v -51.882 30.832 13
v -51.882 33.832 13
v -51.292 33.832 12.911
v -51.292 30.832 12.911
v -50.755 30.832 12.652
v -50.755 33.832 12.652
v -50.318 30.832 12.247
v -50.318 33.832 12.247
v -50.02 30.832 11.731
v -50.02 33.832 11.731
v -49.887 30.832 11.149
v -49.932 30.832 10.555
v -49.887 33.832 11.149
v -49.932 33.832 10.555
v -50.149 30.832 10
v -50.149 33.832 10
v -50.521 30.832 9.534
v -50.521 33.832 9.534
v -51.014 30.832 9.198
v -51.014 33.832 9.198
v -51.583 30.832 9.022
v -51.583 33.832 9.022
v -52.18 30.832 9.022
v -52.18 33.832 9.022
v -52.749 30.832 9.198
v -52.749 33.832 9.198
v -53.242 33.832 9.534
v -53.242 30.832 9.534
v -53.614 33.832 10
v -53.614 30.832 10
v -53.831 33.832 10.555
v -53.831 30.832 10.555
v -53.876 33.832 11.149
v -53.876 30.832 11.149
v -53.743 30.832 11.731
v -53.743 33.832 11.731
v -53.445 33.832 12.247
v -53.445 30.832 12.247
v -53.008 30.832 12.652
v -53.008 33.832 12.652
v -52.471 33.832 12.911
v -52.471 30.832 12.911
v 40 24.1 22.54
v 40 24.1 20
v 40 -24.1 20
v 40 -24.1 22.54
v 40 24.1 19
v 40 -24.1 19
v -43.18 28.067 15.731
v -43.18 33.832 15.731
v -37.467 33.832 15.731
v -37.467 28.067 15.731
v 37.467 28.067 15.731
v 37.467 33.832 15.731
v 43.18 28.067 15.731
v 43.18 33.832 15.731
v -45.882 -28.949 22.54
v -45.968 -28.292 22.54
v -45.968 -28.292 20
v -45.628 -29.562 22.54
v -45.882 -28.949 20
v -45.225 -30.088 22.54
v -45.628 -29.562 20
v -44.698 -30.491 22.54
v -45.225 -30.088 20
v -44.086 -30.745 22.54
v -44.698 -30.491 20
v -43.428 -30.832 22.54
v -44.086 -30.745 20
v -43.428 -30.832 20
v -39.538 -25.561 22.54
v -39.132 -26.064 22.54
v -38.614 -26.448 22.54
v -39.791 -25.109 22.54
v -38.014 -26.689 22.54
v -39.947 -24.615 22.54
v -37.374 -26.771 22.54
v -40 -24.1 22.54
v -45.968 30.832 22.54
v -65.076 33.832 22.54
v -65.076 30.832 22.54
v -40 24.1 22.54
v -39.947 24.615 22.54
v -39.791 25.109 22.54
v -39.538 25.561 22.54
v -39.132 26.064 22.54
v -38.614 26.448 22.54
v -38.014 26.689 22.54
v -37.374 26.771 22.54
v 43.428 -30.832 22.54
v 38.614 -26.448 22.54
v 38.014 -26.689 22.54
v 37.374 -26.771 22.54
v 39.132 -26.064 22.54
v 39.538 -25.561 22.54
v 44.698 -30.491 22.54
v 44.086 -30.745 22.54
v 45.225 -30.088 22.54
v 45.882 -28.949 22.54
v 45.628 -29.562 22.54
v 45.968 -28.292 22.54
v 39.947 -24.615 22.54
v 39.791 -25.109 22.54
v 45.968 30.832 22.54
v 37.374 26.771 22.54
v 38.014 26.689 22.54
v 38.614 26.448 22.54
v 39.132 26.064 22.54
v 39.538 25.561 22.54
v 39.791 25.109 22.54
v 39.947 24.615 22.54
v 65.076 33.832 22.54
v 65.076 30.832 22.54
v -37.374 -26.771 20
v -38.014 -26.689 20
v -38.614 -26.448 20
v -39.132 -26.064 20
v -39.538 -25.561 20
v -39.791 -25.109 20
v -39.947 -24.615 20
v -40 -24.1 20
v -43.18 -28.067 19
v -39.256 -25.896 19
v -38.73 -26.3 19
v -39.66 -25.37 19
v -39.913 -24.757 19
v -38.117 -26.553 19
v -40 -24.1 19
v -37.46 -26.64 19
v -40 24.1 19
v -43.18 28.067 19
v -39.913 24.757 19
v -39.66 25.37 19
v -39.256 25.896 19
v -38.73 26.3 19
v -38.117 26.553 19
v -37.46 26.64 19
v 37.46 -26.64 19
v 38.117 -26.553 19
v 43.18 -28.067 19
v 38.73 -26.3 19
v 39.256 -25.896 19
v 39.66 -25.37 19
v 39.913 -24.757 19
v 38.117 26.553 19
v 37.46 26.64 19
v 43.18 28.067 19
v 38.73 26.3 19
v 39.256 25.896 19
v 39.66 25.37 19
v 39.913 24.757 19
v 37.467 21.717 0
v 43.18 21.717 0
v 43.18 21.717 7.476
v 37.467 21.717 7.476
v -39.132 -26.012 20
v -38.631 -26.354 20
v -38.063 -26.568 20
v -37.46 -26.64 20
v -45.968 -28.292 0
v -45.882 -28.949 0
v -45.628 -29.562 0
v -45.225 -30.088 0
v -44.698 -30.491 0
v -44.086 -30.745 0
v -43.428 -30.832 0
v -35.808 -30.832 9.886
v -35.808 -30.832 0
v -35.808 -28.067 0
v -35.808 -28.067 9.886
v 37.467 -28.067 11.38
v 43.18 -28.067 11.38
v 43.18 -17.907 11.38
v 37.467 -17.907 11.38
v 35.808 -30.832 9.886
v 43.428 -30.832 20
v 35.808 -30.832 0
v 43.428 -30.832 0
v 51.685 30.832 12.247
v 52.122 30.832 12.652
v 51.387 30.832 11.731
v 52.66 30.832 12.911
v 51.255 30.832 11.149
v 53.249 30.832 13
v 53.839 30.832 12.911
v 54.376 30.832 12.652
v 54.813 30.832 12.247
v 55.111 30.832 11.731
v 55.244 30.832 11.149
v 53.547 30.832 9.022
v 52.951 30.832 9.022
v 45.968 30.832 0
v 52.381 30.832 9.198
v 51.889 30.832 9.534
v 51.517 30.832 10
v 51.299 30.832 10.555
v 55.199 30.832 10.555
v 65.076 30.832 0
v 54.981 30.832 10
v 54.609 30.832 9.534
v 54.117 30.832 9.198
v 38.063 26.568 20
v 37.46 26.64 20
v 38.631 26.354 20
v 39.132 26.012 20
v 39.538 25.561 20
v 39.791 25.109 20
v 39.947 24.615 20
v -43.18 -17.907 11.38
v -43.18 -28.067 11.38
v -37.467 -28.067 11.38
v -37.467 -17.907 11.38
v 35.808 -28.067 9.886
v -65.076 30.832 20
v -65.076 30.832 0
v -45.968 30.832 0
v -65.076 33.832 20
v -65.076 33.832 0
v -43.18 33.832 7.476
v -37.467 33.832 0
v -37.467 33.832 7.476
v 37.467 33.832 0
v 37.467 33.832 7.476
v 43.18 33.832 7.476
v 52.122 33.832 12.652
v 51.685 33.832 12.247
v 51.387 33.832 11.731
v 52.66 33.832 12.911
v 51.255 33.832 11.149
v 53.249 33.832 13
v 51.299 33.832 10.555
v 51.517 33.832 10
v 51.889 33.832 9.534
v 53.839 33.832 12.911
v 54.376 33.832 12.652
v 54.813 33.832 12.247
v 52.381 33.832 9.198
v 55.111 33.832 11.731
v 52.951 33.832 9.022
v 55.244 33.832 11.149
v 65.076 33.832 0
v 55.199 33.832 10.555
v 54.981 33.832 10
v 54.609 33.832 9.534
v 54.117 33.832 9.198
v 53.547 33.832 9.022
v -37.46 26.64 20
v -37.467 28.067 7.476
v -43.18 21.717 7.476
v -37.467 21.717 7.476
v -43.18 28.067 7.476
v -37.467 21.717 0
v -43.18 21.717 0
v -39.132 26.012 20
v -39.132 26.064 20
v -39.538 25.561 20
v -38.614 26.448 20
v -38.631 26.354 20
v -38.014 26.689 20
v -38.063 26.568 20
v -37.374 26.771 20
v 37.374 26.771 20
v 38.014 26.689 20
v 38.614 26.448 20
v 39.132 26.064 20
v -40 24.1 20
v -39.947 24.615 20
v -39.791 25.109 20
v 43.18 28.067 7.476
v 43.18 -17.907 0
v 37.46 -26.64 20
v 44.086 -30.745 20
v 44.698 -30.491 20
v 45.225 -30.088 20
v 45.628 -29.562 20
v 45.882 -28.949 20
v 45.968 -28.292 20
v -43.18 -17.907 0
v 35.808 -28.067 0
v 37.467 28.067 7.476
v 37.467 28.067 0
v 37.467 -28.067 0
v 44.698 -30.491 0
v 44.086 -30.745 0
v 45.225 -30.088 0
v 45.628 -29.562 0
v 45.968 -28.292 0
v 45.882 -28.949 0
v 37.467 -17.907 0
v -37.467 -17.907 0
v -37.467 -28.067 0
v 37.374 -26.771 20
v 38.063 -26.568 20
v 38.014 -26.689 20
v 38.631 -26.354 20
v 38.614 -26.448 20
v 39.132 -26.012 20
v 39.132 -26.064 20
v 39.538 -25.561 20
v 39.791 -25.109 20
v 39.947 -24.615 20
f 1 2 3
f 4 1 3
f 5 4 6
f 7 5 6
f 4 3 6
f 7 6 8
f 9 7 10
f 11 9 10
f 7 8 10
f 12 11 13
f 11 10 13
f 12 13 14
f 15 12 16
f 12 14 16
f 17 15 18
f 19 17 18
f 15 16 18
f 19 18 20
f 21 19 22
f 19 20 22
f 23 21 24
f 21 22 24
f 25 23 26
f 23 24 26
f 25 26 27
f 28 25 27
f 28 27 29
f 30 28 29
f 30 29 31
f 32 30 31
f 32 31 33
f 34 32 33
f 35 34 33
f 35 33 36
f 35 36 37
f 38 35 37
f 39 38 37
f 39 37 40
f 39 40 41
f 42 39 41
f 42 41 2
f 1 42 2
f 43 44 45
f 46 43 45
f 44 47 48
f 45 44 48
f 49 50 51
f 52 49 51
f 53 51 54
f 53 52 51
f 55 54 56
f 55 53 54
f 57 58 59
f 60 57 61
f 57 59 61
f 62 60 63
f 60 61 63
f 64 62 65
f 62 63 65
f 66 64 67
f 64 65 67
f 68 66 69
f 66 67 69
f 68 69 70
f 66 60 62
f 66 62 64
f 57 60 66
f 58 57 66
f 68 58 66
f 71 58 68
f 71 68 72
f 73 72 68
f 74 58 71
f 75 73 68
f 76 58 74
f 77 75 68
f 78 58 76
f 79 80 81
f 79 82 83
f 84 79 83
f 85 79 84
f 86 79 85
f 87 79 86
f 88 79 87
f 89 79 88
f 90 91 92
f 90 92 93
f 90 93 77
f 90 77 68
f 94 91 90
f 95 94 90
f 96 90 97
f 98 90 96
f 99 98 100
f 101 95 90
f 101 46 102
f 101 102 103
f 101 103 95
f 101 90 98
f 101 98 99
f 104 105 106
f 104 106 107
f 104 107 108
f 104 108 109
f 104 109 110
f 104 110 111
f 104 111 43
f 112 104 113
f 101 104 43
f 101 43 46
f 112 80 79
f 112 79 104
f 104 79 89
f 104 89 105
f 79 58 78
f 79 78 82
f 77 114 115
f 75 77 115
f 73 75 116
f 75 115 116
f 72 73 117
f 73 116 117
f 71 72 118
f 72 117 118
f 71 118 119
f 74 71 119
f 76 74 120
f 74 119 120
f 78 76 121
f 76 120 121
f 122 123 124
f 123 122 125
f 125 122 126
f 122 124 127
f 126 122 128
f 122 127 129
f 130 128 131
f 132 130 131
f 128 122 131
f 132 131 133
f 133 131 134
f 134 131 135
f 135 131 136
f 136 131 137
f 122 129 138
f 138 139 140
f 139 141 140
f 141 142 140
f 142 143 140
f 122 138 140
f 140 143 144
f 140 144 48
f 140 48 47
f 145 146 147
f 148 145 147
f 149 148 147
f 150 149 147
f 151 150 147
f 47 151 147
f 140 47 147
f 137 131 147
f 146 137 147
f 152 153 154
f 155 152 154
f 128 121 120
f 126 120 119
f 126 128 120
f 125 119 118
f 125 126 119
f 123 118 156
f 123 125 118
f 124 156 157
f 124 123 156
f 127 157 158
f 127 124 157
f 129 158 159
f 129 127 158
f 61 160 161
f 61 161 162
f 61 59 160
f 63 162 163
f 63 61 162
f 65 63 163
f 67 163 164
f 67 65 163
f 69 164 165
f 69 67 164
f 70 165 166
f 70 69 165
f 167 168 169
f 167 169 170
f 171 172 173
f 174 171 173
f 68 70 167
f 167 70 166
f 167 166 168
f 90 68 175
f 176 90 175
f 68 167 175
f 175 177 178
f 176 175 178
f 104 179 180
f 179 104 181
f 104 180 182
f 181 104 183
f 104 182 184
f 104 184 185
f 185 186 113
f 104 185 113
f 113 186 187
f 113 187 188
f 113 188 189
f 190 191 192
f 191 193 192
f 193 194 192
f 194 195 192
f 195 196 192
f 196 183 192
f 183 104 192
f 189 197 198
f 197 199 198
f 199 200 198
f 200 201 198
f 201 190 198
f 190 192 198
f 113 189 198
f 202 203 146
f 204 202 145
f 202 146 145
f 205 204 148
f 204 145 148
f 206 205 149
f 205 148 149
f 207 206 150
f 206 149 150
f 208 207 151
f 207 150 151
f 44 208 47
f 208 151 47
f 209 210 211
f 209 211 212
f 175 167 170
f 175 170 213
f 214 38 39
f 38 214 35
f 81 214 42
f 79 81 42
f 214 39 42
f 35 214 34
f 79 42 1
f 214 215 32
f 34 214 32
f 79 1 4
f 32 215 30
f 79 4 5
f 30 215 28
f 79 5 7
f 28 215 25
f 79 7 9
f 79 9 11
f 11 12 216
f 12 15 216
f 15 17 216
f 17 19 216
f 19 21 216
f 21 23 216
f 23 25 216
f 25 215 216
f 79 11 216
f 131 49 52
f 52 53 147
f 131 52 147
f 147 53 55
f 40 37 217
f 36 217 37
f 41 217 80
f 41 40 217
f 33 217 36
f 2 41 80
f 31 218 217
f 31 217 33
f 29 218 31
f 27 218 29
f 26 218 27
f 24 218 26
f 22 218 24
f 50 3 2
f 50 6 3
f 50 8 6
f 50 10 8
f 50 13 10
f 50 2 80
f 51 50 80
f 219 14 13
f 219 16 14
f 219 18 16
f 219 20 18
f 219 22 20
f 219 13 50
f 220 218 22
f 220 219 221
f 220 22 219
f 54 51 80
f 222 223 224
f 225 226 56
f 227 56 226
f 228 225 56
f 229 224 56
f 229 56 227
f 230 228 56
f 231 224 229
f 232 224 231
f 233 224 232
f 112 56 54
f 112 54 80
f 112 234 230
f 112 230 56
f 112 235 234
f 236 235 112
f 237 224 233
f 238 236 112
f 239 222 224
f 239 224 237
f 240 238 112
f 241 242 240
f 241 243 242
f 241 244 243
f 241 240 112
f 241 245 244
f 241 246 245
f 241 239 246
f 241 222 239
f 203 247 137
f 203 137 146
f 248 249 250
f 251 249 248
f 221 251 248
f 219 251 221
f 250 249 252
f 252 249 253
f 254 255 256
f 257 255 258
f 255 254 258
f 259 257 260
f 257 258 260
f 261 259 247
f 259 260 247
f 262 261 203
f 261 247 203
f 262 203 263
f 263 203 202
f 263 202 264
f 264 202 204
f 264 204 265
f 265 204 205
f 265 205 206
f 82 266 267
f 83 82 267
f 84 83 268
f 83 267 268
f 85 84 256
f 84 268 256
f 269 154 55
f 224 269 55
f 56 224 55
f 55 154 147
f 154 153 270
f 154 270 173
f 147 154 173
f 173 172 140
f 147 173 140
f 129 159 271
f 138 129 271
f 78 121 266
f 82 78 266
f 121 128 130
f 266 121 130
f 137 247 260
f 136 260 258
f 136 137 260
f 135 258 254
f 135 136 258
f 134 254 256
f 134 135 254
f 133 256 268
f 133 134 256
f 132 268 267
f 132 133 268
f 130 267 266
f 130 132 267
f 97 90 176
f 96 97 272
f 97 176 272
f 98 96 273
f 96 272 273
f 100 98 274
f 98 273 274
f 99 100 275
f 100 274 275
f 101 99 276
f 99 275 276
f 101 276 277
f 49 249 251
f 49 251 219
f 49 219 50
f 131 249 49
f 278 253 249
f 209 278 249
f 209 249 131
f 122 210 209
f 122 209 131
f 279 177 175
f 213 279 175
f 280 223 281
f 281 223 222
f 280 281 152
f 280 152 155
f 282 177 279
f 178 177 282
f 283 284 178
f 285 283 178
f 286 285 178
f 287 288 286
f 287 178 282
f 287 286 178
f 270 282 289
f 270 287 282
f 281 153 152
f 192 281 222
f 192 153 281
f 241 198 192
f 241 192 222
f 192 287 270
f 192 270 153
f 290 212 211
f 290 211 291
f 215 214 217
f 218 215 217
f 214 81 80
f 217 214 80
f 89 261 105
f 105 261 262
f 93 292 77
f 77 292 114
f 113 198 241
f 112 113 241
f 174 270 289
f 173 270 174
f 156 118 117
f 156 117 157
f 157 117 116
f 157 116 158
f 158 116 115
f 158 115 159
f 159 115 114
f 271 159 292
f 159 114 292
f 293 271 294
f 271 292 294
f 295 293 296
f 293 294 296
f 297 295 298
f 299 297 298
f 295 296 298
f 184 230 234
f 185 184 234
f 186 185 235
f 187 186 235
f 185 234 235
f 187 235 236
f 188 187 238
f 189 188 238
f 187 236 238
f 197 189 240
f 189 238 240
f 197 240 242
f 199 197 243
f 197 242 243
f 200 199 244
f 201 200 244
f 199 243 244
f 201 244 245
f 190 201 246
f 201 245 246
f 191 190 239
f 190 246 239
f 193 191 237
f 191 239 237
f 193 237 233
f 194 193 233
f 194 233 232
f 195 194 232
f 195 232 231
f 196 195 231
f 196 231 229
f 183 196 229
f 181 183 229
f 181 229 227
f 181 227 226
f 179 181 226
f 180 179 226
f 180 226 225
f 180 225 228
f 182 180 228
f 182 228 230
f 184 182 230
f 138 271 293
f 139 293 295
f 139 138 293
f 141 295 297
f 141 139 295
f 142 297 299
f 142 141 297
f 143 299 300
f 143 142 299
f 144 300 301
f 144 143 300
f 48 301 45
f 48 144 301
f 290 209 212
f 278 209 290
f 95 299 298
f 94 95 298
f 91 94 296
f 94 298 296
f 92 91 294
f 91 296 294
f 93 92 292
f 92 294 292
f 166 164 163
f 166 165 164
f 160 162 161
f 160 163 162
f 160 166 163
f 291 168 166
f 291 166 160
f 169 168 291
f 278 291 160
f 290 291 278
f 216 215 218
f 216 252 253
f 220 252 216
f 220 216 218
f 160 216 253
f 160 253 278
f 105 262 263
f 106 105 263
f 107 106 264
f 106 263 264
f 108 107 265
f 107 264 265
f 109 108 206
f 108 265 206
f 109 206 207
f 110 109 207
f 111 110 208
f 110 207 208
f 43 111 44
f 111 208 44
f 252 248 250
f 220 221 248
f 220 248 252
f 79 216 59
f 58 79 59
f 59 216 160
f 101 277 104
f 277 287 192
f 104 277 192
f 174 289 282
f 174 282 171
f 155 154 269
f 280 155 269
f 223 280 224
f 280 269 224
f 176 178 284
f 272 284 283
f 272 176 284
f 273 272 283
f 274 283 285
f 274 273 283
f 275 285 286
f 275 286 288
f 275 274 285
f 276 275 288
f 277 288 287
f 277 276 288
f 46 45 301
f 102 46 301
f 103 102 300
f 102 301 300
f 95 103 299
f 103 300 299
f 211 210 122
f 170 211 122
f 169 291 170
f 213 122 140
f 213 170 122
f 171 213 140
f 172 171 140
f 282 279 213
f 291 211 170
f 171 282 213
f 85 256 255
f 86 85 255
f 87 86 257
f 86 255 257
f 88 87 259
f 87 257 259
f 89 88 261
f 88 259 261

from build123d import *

# Parameters (mm, degrees)
SKETCH1_W            = 91.936945468
SKETCH1_H            = 61.663418702
SKETCH1_W_2          = 86.36
SKETCH1_H_2          = 56.134
BOSS_EXTRUDE1_DEPTH  = 20
SKETCH2_W            = 86.36
SKETCH2_H            = 56.134
BOSS_EXTRUDE3_DEPTH  = 1
SKETCH4_W            = 80
SKETCH4_H            = 53.28
CUT_EXTRUDE6_DEPTH   = 59.853162931
SKETCH5_W            = 155.947075919
SKETCH5_H            = 20
BOSS_EXTRUDE4_DEPTH  = 3
SKETCH8_W            = 12.917881336
SKETCH8_H            = 3
CUT_EXTRUDE7_DEPTH   = 88.335862802
SKETCH9_W            = 12.878183793
SKETCH9_H            = 3
CUT_EXTRUDE8_DEPTH   = 88.300413605
SKETCH10_R           = 2
CUT_EXTRUDE9_DEPTH   = 94.894510599
SKETCH10_3_R         = 2
CUT_EXTRUDE10_DEPTH  = 94.894510599
SKETCH11_W           = 74.933585118
SKETCH11_H           = 15.731166257
CUT_EXTRUDE11_DEPTH  = 20
FILLET1_R            = 2.54
FILLET2_R            = 2.54
FILLET3_R            = 2.54
FILLET4_R            = 2.54
FILLET5_R            = 2.54
FILLET6_R            = 2.54
SKETCH14_W           = 5.713207441
SKETCH14_H           = 8.255
CUT_EXTRUDE12_DEPTH  = 91.021549452
SKETCH15_W           = 5.713207441
SKETCH15_H           = 8.255
CUT_EXTRUDE13_DEPTH  = 91.021549452
SKETCH16_W           = 7.476166257
SKETCH16_H           = 6.35
BOSS_EXTRUDE5_DEPTH  = 5.713207
SKETCH17_W           = 7.476166257
SKETCH17_H           = 6.35
BOSS_EXTRUDE6_DEPTH  = 5.713207441
SKETCH18_W           = 11.38
SKETCH18_H           = 10.16
BOSS_EXTRUDE7_DEPTH  = 5.713207441
SKETCH19_W           = 11.38
SKETCH19_H           = 10.16
BOSS_EXTRUDE8_DEPTH  = 5.713207441
SKETCH20_W           = 71.616945468
SKETCH20_H           = 9.886340198
CUT_EXTRUDE14_DEPTH  = 94.894510599
SKETCH23_W           = 130.15101079
SKETCH23_H           = 3
BOSS_EXTRUDE14_DEPTH = 2.54


with BuildPart() as part:
    # Sketch1 → Boss-Extrude1 (new body)
    with BuildSketch(Plane.XY):
        Rectangle(SKETCH1_W, SKETCH1_H)
        Rectangle(SKETCH1_W_2, SKETCH1_H_2, mode=Mode.SUBTRACT)
    extrude(amount=BOSS_EXTRUDE1_DEPTH)

    # Sketch2 → Boss-Extrude3 (add)
    with BuildSketch(Plane.XY.offset(20)):
        Rectangle(SKETCH2_W, SKETCH2_H)
    extrude(amount=-BOSS_EXTRUDE3_DEPTH)

    # Sketch4 → Cut-Extrude6 (cut, through all)
    with BuildSketch(Plane.XY.offset(20)):
        Rectangle(SKETCH4_W, SKETCH4_H)
    extrude(amount=-CUT_EXTRUDE6_DEPTH, mode=Mode.SUBTRACT)

    # Sketch5 → Boss-Extrude4 (add)
    with BuildSketch(Plane(origin=(0, 30.831709351, 0), x_dir=(1, 0, 0), z_dir=(0, 1, 0))):
        with Locations((0.019848772, -10)):
            Rectangle(SKETCH5_W, SKETCH5_H)
    extrude(amount=BOSS_EXTRUDE4_DEPTH)

    # Sketch8 → Cut-Extrude7 (cut, through all)
    with BuildSketch(Plane.XY.offset(20)):
        with Locations((71.534446063, 32.331709351)):
            Rectangle(SKETCH8_W, SKETCH8_H)
    extrude(amount=-CUT_EXTRUDE7_DEPTH, mode=Mode.SUBTRACT)

    # Sketch9 → Cut-Extrude8 (cut, through all)
    with BuildSketch(Plane.XY.offset(20)):
        with Locations((-71.514597291, 32.331709351)):
            Rectangle(SKETCH9_W, SKETCH9_H)
    extrude(amount=-CUT_EXTRUDE8_DEPTH, mode=Mode.SUBTRACT)

    # Sketch10 → Cut-Extrude9 (cut, through all)
    with BuildSketch(Plane(origin=(0, 33.831709351, 0), x_dir=(1, 0, 0), z_dir=(0, 1, 0))):
        with Locations(Location((53.249133704, -11, 0), (0, 0, 270))):
            Circle(SKETCH10_R)
    extrude(amount=-CUT_EXTRUDE9_DEPTH, mode=Mode.SUBTRACT)

    # Sketch10<3> → Cut-Extrude10 (cut, through all)
    with BuildSketch(Plane(origin=(0, 33.831709351, 0), x_dir=(1, 0, 0), z_dir=(0, 1, 0))):
        with Locations(Location((53.249133704, -11, 0), (0, 0, 270))):
            Circle(SKETCH10_3_R)
        with Locations(Location((-51.881510593, -11, 0), (0, 0, 270))):
            Circle(SKETCH10_3_R)
    extrude(amount=-CUT_EXTRUDE10_DEPTH, mode=Mode.SUBTRACT)

    # Sketch11 → Cut-Extrude11 (cut)
    with BuildSketch(Plane(origin=(0, 33.831709351, 0), x_dir=(1, 0, 0), z_dir=(0, 1, 0))):
        with Locations((0, -7.865583129)):
            Rectangle(SKETCH11_W, SKETCH11_H)
    extrude(amount=-CUT_EXTRUDE11_DEPTH, mode=Mode.SUBTRACT)

    # Fillet1
    fillet1_edges = [part.edges().sort_by_distance(p)[0] for p in [
        (40, 26.64, 19.5),
    ]]
    fillet(fillet1_edges, radius=FILLET1_R)

    # Fillet2
    fillet2_edges = [part.edges().sort_by_distance(p)[0] for p in [
        (-40, 26.64, 19.5),
    ]]
    fillet(fillet2_edges, radius=FILLET2_R)

    # Fillet3
    fillet3_edges = [part.edges().sort_by_distance(p)[0] for p in [
        (-40, -26.64, 19.5),
    ]]
    fillet(fillet3_edges, radius=FILLET3_R)

    # Fillet4
    fillet4_edges = [part.edges().sort_by_distance(p)[0] for p in [
        (40, -26.64, 19.5),
    ]]
    fillet(fillet4_edges, radius=FILLET4_R)

    # Fillet5
    fillet5_edges = [part.edges().sort_by_distance(p)[0] for p in [
        (-45.968472734, -30.831709351, 10),
    ]]
    fillet(fillet5_edges, radius=FILLET5_R)

    # Fillet6
    fillet6_edges = [part.edges().sort_by_distance(p)[0] for p in [
        (45.968472734, -30.831709351, 10),
    ]]
    fillet(fillet6_edges, radius=FILLET6_R)

    # Sketch14 → Cut-Extrude12 (cut, through all)
    with BuildSketch(Plane.XZ.offset(-28.067)):
        with Locations((40.32339628, 11.603666257)):
            Rectangle(SKETCH14_W, SKETCH14_H)
    extrude(amount=-CUT_EXTRUDE12_DEPTH, mode=Mode.SUBTRACT)

    # Sketch15 → Cut-Extrude13 (cut, through all)
    with BuildSketch(Plane.XZ.offset(-28.067)):
        with Locations((-40.32339628, 11.603666257)):
            Rectangle(SKETCH15_W, SKETCH15_H)
    extrude(amount=-CUT_EXTRUDE13_DEPTH, mode=Mode.SUBTRACT)

    # Sketch16 → Boss-Extrude5 (add)
    with BuildSketch(Plane.ZY.offset(-43.18)):
        with Locations((3.738083129, 24.892)):
            Rectangle(SKETCH16_W, SKETCH16_H)
    extrude(amount=BOSS_EXTRUDE5_DEPTH)

    # Sketch17 → Boss-Extrude6 (add)
    with BuildSketch(Plane(origin=(-43.18, 0, 0), x_dir=(0, 0, -1), z_dir=(1, 0, 0))):
        with Locations((-3.738083129, 24.892)):
            Rectangle(SKETCH17_W, SKETCH17_H)
    extrude(amount=BOSS_EXTRUDE6_DEPTH)

    # Sketch18 → Boss-Extrude7 (add)
    with BuildSketch(Plane(origin=(-43.18, 0, 0), x_dir=(0, 0, -1), z_dir=(1, 0, 0))):
        with Locations((-5.69, -22.987)):
            Rectangle(SKETCH18_W, SKETCH18_H)
    extrude(amount=BOSS_EXTRUDE7_DEPTH)

    # Sketch19 → Boss-Extrude8 (add)
    with BuildSketch(Plane.ZY.offset(-43.18)):
        with Locations((5.69, -22.987)):
            Rectangle(SKETCH19_W, SKETCH19_H)
    extrude(amount=BOSS_EXTRUDE8_DEPTH)

    # Sketch20 → Cut-Extrude14 (cut, through all)
    with BuildSketch(Plane.XZ.offset(30.831709351)):
        with Locations((0, 4.943170099)):
            Rectangle(SKETCH20_W, SKETCH20_H)
    extrude(amount=-CUT_EXTRUDE14_DEPTH, mode=Mode.SUBTRACT)

    # Sketch23 → Boss-Extrude14 (add)
    # profile 1 of 2: a face of its own
    with BuildSketch(Plane.XY.offset(20)):
        with BuildLine():
            Line((-43.428472734, -30.831709351), (43.428472734, -30.831709351))
            ThreePointArc((43.428472734, -30.831709351), (45.224523958, -30.087760575), (45.968472734, -28.291709351))
            Line((45.968472734, -28.291709351), (45.968472734, 30.831709351))
            Line((45.968472734, 30.831709351), (-45.968472734, 30.831709351))
            Line((-45.968472734, 30.831709351), (-45.968472734, -28.291709351))
            ThreePointArc((-45.968472734, -28.291709351), (-45.224523958, -30.087760575), (-43.428472734, -30.831709351))
        make_face()
        with BuildLine():
            ThreePointArc((39.537823304, -25.560907361), (38.61351341, -26.44781055), (37.373915264, -26.770831426))
            Line((37.373915264, -26.770831426), (-37.373915264, -26.770831426))
            ThreePointArc((-37.373915264, -26.770831426), (-38.61351341, -26.44781055), (-39.537823304, -25.560907361))
            ThreePointArc((-39.537823304, -25.560907361), (-39.881700972, -24.866136022), (-40, -24.1))
            Line((-40, -24.1), (-40, 24.1))
            ThreePointArc((-40, 24.1), (-39.881700972, 24.866136022), (-39.537823304, 25.560907361))
            ThreePointArc((-39.537823304, 25.560907361), (-38.61351341, 26.44781055), (-37.373915264, 26.770831426))
            Line((-37.373915264, 26.770831426), (37.373915264, 26.770831426))
            ThreePointArc((37.373915264, 26.770831426), (38.61351341, 26.44781055), (39.537823304, 25.560907361))
            ThreePointArc((39.537823304, 25.560907361), (39.881700972, 24.866136022), (40, 24.1))
            Line((40, 24.1), (40, -24.1))
            ThreePointArc((40, -24.1), (39.881700972, -24.866136022), (39.537823304, -25.560907361))
        make_face(mode=Mode.SUBTRACT)
    # profile 2 of 2: a face of its own
    with BuildSketch(Plane.XY.offset(20)):
        with Locations((0, 32.331709351)):
            Rectangle(SKETCH23_W, SKETCH23_H)
    extrude(amount=BOSS_EXTRUDE14_DEPTH)


solid = part.part
